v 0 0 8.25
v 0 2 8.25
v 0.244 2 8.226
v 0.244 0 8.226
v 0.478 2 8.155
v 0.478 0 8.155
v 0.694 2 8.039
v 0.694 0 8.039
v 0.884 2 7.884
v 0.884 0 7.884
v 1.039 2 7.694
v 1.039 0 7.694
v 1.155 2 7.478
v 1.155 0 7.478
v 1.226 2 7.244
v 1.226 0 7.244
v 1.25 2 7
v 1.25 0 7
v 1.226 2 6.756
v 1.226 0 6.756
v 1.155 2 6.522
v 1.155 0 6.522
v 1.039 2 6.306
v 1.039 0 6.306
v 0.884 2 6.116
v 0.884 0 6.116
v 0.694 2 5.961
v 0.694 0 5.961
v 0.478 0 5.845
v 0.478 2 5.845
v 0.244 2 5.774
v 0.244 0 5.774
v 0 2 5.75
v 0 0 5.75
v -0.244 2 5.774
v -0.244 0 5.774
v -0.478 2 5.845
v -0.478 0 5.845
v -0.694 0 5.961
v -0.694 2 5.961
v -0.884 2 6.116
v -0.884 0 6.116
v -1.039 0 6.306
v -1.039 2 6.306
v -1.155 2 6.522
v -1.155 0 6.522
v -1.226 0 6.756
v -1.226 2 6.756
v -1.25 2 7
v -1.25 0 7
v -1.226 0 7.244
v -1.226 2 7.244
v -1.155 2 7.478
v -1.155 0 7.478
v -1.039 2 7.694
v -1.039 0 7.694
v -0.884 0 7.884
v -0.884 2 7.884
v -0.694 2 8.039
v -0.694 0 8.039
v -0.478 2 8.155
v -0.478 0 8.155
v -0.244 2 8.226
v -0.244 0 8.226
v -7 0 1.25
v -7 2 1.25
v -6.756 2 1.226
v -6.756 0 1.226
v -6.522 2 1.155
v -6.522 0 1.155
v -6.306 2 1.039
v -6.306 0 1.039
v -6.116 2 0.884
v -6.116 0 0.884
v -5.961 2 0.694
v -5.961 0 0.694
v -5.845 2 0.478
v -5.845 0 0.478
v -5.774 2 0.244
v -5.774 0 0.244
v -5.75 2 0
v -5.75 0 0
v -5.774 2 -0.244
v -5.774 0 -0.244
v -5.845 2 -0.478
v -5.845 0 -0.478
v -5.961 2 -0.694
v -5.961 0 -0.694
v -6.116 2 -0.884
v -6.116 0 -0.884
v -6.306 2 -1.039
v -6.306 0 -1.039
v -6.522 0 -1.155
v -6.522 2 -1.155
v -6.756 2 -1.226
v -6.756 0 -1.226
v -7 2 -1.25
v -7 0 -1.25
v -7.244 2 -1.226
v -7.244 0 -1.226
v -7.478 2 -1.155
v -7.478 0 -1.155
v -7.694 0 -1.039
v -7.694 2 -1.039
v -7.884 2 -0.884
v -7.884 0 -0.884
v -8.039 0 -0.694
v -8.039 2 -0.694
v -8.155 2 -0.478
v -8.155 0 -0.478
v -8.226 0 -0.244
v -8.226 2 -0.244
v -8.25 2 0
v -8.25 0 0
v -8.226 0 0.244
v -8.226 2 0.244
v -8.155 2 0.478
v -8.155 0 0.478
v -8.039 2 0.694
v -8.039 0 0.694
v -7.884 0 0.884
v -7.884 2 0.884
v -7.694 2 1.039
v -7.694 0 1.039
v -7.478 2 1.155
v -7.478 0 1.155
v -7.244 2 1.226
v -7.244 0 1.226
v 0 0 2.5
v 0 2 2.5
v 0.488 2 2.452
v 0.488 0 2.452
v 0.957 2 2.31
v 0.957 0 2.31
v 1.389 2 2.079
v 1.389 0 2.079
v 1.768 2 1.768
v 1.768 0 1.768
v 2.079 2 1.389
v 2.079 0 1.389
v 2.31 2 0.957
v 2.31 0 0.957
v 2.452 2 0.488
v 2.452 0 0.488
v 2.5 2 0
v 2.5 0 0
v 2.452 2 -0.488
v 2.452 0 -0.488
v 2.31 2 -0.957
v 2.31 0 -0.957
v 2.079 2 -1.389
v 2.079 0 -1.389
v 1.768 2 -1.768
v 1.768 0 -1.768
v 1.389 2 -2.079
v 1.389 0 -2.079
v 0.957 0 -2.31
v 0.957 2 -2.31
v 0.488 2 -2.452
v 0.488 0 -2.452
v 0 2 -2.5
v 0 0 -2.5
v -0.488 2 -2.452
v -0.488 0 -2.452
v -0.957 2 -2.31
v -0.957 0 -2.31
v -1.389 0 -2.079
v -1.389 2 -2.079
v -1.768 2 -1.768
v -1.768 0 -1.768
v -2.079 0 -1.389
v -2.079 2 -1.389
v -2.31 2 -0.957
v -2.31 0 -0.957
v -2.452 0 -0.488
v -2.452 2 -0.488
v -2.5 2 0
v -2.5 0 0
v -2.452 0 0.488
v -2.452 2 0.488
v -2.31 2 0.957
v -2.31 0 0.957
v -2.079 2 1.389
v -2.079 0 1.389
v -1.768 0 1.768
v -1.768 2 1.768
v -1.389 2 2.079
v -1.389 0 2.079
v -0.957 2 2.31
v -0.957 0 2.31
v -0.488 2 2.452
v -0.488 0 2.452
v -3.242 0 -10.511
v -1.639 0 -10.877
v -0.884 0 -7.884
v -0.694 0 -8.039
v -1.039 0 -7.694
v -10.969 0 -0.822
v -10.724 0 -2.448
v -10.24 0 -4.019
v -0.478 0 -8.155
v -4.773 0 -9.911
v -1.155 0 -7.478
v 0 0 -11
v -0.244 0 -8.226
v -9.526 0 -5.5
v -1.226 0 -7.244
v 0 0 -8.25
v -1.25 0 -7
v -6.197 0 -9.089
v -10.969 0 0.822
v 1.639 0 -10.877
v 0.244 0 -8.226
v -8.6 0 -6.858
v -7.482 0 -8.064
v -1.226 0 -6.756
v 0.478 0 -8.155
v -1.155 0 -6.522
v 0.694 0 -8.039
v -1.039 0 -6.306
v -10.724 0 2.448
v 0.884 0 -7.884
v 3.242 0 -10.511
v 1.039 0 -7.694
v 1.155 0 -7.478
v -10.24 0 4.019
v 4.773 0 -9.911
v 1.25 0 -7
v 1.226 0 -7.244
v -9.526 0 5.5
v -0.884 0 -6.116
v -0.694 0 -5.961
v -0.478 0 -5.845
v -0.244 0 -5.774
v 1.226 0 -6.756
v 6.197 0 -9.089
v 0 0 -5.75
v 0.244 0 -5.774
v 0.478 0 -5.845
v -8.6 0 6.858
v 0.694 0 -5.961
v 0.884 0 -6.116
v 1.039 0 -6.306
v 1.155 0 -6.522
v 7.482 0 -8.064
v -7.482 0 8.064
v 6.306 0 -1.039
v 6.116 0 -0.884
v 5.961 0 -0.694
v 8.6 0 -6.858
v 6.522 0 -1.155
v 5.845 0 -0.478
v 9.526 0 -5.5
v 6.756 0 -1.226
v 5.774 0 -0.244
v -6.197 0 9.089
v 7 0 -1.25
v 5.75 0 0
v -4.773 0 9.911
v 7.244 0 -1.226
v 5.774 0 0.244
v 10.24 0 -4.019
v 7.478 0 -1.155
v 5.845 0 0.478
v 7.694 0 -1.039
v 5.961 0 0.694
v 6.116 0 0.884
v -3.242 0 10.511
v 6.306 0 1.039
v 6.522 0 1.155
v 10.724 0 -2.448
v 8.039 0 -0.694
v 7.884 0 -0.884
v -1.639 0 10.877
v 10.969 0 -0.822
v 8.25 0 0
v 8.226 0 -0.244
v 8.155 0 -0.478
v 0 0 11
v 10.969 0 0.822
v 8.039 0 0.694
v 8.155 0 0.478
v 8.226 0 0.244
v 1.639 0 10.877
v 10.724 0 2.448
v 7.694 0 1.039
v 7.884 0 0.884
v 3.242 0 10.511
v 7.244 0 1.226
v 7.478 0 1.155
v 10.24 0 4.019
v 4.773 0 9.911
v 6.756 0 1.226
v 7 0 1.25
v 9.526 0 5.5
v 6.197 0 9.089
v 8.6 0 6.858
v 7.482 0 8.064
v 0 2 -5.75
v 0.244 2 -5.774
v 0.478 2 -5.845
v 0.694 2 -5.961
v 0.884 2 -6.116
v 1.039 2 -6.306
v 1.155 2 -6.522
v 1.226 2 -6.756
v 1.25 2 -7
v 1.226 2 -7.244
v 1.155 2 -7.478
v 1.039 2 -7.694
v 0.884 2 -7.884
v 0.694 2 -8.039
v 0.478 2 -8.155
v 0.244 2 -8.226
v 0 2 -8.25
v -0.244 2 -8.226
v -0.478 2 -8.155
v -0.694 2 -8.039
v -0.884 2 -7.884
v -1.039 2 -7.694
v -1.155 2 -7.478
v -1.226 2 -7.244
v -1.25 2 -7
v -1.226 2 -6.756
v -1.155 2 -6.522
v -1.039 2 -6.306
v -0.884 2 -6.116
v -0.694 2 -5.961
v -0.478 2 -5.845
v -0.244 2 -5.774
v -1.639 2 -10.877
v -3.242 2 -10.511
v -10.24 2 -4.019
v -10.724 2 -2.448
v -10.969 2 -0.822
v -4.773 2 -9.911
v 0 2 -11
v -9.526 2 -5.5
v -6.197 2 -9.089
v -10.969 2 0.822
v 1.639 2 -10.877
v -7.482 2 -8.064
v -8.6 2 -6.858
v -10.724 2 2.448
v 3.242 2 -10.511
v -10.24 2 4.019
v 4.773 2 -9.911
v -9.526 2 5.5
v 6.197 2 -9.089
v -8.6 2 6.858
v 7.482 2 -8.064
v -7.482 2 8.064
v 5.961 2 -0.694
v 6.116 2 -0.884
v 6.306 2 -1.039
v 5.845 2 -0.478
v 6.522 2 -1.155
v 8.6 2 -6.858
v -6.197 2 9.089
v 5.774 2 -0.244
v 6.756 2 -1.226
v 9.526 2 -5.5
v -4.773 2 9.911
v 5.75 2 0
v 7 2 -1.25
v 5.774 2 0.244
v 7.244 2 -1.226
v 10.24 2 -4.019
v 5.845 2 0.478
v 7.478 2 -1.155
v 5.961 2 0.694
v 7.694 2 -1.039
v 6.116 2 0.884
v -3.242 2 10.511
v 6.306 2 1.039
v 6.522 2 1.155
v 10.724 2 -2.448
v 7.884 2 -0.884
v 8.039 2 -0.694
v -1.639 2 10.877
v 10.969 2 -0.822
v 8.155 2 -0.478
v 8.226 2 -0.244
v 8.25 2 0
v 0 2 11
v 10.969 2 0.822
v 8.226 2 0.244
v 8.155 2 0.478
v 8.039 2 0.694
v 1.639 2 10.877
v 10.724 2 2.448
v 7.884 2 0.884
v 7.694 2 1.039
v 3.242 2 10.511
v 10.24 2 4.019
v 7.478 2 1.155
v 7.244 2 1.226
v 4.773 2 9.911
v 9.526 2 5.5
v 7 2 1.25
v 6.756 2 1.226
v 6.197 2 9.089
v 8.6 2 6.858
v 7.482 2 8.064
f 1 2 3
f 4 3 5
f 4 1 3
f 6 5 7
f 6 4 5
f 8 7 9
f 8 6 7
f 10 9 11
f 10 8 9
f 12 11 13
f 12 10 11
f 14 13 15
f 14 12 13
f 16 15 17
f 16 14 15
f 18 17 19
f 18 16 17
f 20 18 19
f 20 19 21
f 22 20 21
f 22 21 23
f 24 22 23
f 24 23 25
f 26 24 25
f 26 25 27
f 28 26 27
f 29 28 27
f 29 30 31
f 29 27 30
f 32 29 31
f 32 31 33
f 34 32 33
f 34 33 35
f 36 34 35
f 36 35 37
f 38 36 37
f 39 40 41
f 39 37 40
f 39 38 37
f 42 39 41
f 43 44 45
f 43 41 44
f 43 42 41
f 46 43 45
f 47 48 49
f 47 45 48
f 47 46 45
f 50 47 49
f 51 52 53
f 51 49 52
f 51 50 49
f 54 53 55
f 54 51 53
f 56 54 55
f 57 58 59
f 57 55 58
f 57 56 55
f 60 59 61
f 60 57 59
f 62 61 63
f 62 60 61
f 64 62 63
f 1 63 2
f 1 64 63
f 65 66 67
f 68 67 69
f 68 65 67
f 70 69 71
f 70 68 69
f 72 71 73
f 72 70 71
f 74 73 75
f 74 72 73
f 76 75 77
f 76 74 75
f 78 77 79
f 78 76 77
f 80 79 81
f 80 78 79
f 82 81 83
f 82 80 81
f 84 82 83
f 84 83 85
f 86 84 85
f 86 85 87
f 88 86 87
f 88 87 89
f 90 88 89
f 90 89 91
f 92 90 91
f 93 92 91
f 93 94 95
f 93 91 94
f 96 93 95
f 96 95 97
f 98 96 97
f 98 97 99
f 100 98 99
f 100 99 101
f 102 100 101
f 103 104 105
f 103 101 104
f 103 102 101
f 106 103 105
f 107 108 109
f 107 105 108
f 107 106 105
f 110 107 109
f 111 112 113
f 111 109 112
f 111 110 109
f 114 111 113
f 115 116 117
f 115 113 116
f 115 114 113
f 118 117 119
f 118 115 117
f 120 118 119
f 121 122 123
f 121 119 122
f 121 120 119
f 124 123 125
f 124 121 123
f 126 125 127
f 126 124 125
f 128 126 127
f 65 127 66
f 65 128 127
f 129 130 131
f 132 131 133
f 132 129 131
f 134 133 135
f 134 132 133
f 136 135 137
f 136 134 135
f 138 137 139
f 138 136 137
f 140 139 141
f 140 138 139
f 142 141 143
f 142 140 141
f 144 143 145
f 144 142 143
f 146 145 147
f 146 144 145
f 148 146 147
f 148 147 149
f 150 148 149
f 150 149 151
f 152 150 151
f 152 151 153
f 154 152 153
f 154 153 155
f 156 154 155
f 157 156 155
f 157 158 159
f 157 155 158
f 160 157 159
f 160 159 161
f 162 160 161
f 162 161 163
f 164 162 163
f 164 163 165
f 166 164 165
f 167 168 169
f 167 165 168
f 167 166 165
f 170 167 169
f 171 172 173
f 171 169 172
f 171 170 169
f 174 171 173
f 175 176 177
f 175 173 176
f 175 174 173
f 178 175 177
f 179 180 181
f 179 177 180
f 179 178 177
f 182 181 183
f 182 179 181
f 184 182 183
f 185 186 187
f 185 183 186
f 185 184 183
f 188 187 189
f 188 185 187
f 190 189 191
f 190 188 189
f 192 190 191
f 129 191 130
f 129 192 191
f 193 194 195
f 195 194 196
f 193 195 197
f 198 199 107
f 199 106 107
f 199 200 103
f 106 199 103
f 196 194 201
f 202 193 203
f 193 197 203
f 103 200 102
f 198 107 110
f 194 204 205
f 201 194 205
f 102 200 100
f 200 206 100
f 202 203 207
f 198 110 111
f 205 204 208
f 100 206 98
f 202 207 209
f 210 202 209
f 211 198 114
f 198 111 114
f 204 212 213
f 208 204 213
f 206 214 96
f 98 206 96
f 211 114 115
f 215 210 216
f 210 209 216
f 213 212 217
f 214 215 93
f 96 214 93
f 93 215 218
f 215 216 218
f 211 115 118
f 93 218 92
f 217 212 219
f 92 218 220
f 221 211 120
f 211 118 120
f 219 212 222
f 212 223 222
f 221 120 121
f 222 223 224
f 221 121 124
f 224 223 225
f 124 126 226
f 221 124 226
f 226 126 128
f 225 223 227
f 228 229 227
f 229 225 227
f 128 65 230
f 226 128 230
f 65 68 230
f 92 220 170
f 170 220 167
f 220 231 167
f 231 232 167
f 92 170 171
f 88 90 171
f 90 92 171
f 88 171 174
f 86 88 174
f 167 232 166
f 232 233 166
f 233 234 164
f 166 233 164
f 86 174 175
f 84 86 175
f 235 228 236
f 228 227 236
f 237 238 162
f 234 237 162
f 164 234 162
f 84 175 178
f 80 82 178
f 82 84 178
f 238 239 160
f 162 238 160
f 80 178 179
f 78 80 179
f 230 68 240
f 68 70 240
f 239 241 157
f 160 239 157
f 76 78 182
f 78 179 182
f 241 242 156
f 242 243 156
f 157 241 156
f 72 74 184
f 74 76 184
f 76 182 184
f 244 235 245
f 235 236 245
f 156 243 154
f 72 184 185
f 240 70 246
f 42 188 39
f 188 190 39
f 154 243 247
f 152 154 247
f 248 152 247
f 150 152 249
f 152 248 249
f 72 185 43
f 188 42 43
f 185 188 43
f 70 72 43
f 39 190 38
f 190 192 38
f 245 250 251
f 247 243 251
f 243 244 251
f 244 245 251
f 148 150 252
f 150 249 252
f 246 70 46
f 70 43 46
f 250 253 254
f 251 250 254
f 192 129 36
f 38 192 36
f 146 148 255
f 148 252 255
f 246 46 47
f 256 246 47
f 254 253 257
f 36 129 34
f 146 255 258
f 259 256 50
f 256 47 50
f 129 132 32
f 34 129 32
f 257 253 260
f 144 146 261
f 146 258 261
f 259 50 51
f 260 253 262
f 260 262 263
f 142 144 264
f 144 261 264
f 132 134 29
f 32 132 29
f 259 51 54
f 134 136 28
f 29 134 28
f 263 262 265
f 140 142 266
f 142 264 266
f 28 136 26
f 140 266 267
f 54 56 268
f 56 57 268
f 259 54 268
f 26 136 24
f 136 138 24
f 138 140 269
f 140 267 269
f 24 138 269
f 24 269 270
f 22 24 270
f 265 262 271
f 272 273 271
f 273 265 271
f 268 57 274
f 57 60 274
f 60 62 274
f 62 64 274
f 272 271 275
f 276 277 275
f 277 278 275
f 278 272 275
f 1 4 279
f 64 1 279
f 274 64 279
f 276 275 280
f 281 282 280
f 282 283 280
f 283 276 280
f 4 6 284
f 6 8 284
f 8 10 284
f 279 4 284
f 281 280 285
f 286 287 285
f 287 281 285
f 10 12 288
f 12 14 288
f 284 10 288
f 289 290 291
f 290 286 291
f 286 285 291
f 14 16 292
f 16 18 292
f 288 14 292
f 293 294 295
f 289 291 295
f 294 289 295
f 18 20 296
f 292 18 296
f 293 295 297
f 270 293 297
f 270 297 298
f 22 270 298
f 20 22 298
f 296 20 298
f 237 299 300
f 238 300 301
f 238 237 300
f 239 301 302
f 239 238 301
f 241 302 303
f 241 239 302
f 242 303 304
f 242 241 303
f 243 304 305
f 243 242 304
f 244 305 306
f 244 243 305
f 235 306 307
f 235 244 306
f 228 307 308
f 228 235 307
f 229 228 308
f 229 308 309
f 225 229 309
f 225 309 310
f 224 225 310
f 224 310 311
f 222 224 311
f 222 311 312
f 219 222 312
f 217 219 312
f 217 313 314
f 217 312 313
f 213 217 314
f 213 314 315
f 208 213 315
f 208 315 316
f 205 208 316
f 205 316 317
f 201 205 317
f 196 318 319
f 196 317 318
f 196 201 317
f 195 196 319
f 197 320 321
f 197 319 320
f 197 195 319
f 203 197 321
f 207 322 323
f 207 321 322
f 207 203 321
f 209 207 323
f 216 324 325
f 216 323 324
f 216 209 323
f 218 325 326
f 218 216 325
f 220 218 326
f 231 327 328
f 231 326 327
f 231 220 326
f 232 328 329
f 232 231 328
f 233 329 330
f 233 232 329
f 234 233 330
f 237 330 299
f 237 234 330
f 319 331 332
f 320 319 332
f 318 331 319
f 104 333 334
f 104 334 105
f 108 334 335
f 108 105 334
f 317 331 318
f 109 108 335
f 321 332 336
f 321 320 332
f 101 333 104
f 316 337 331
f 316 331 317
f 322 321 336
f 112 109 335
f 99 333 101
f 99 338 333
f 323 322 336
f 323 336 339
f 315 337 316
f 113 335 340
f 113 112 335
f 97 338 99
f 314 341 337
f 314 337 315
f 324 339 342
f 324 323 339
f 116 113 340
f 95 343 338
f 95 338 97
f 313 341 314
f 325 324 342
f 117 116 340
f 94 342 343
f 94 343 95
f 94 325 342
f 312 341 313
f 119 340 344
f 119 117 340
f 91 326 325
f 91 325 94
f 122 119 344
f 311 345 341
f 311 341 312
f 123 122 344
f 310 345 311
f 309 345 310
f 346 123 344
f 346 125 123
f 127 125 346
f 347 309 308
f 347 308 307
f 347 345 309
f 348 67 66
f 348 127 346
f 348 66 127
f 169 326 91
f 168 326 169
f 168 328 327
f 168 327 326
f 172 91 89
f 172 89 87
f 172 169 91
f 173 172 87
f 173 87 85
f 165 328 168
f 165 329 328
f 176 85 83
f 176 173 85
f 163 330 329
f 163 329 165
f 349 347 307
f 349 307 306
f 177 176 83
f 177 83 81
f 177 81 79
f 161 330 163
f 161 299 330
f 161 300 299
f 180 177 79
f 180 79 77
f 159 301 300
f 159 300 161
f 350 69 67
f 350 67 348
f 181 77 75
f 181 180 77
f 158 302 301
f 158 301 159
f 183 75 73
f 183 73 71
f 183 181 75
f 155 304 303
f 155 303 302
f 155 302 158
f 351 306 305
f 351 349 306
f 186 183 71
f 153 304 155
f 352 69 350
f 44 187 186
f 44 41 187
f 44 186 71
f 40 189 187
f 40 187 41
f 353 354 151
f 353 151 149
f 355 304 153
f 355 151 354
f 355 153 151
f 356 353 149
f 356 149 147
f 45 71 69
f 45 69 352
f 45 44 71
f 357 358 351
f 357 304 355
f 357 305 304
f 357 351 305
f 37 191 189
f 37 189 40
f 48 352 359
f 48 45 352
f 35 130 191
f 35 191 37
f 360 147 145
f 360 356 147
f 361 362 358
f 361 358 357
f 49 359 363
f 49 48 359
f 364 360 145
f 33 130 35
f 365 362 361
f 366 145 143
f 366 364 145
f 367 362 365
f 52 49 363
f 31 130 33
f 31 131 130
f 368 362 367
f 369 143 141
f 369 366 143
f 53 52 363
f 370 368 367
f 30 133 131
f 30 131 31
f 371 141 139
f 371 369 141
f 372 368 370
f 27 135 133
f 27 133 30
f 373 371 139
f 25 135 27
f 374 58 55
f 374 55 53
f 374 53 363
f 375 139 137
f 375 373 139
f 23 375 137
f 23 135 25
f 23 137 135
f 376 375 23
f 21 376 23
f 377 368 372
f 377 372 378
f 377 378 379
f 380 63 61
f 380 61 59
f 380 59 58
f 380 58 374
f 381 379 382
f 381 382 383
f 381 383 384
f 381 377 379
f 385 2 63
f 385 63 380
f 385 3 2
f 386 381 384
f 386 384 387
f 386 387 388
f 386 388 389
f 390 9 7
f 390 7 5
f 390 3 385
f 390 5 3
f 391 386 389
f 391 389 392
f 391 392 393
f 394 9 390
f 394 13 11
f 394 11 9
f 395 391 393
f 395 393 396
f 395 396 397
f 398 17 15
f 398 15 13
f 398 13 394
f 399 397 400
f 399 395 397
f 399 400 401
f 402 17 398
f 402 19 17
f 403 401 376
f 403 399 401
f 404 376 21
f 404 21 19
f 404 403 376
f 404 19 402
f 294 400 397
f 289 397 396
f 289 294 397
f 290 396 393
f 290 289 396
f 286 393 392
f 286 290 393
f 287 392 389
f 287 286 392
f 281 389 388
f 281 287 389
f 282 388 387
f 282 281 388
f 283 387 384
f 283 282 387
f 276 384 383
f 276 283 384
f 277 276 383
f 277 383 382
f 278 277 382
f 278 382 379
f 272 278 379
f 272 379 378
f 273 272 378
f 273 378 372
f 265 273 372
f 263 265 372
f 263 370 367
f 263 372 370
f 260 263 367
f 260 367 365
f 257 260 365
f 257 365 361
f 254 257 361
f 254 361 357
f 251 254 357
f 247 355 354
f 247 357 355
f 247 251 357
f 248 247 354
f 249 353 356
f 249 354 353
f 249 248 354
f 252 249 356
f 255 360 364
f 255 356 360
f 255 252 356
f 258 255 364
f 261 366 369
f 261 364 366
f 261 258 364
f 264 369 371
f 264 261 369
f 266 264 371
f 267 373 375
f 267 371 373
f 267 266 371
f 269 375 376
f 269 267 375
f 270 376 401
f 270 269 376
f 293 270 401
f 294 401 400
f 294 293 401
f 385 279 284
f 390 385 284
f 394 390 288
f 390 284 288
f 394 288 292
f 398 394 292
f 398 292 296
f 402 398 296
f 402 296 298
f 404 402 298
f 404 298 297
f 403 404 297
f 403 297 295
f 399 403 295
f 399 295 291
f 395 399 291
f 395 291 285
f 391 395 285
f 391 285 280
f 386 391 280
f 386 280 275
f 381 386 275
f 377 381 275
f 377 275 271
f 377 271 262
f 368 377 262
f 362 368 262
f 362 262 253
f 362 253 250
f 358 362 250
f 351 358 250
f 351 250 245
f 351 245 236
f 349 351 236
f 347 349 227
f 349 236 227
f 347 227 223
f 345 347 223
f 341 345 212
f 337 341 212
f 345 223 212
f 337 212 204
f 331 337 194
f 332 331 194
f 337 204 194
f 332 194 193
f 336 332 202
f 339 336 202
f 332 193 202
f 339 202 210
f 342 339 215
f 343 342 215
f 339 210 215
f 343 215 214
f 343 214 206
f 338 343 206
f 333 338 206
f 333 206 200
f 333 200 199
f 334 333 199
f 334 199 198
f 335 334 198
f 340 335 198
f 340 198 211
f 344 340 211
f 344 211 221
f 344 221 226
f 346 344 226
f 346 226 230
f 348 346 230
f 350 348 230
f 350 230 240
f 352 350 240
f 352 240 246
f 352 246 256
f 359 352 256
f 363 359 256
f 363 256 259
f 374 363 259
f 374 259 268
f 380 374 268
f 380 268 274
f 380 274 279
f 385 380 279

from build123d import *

# Parameters (mm, degrees)
SKETCH1_R           = 11
SKETCH1_R_2         = 2.5
SKETCH1_R_3         = 1.25
BOSS_EXTRUDE1_DEPTH = 3
CUT_EXTRUDE1_START  = -1
SKETCH2_R           = 11
CUT_EXTRUDE1_DEPTH  = 1


with BuildPart() as part:
    # Sketch1 → Boss-Extrude1 (new body)
    with BuildSketch(Plane(origin=(0, 0, 0), x_dir=(1, 0, 0), z_dir=(0, 1, 0))):
        with Locations(Location((0, 0, 0), (0, 0, 270))):
            Circle(SKETCH1_R)
        with Locations(Location((0, 0, 0), (0, 0, 270))):
            Circle(SKETCH1_R_2, mode=Mode.SUBTRACT)
        with Locations(Location((0, 7, 0), (0, 0, 270))):
            Circle(SKETCH1_R_3, mode=Mode.SUBTRACT)
        with Locations(Location((7, 0, 0), (0, 0, 270))):
            Circle(SKETCH1_R_3, mode=Mode.SUBTRACT)
        with Locations(Location((0, -7, 0), (0, 0, 270))):
            Circle(SKETCH1_R_3, mode=Mode.SUBTRACT)
        with Locations(Location((-7, 0, 0), (0, 0, 270))):
            Circle(SKETCH1_R_3, mode=Mode.SUBTRACT)
    extrude(amount=BOSS_EXTRUDE1_DEPTH)

    # Sketch2 → Cut-Extrude1 (cut)
    with BuildSketch(Plane(origin=(0, 3, 0), x_dir=(1, 0, 0), z_dir=(0, 1, 0)).offset(CUT_EXTRUDE1_START)):
        with Locations(Location((0, 0, 0), (0, 0, 270))):
            Circle(SKETCH2_R)
    extrude(amount=CUT_EXTRUDE1_DEPTH, mode=Mode.SUBTRACT)


solid = part.part
